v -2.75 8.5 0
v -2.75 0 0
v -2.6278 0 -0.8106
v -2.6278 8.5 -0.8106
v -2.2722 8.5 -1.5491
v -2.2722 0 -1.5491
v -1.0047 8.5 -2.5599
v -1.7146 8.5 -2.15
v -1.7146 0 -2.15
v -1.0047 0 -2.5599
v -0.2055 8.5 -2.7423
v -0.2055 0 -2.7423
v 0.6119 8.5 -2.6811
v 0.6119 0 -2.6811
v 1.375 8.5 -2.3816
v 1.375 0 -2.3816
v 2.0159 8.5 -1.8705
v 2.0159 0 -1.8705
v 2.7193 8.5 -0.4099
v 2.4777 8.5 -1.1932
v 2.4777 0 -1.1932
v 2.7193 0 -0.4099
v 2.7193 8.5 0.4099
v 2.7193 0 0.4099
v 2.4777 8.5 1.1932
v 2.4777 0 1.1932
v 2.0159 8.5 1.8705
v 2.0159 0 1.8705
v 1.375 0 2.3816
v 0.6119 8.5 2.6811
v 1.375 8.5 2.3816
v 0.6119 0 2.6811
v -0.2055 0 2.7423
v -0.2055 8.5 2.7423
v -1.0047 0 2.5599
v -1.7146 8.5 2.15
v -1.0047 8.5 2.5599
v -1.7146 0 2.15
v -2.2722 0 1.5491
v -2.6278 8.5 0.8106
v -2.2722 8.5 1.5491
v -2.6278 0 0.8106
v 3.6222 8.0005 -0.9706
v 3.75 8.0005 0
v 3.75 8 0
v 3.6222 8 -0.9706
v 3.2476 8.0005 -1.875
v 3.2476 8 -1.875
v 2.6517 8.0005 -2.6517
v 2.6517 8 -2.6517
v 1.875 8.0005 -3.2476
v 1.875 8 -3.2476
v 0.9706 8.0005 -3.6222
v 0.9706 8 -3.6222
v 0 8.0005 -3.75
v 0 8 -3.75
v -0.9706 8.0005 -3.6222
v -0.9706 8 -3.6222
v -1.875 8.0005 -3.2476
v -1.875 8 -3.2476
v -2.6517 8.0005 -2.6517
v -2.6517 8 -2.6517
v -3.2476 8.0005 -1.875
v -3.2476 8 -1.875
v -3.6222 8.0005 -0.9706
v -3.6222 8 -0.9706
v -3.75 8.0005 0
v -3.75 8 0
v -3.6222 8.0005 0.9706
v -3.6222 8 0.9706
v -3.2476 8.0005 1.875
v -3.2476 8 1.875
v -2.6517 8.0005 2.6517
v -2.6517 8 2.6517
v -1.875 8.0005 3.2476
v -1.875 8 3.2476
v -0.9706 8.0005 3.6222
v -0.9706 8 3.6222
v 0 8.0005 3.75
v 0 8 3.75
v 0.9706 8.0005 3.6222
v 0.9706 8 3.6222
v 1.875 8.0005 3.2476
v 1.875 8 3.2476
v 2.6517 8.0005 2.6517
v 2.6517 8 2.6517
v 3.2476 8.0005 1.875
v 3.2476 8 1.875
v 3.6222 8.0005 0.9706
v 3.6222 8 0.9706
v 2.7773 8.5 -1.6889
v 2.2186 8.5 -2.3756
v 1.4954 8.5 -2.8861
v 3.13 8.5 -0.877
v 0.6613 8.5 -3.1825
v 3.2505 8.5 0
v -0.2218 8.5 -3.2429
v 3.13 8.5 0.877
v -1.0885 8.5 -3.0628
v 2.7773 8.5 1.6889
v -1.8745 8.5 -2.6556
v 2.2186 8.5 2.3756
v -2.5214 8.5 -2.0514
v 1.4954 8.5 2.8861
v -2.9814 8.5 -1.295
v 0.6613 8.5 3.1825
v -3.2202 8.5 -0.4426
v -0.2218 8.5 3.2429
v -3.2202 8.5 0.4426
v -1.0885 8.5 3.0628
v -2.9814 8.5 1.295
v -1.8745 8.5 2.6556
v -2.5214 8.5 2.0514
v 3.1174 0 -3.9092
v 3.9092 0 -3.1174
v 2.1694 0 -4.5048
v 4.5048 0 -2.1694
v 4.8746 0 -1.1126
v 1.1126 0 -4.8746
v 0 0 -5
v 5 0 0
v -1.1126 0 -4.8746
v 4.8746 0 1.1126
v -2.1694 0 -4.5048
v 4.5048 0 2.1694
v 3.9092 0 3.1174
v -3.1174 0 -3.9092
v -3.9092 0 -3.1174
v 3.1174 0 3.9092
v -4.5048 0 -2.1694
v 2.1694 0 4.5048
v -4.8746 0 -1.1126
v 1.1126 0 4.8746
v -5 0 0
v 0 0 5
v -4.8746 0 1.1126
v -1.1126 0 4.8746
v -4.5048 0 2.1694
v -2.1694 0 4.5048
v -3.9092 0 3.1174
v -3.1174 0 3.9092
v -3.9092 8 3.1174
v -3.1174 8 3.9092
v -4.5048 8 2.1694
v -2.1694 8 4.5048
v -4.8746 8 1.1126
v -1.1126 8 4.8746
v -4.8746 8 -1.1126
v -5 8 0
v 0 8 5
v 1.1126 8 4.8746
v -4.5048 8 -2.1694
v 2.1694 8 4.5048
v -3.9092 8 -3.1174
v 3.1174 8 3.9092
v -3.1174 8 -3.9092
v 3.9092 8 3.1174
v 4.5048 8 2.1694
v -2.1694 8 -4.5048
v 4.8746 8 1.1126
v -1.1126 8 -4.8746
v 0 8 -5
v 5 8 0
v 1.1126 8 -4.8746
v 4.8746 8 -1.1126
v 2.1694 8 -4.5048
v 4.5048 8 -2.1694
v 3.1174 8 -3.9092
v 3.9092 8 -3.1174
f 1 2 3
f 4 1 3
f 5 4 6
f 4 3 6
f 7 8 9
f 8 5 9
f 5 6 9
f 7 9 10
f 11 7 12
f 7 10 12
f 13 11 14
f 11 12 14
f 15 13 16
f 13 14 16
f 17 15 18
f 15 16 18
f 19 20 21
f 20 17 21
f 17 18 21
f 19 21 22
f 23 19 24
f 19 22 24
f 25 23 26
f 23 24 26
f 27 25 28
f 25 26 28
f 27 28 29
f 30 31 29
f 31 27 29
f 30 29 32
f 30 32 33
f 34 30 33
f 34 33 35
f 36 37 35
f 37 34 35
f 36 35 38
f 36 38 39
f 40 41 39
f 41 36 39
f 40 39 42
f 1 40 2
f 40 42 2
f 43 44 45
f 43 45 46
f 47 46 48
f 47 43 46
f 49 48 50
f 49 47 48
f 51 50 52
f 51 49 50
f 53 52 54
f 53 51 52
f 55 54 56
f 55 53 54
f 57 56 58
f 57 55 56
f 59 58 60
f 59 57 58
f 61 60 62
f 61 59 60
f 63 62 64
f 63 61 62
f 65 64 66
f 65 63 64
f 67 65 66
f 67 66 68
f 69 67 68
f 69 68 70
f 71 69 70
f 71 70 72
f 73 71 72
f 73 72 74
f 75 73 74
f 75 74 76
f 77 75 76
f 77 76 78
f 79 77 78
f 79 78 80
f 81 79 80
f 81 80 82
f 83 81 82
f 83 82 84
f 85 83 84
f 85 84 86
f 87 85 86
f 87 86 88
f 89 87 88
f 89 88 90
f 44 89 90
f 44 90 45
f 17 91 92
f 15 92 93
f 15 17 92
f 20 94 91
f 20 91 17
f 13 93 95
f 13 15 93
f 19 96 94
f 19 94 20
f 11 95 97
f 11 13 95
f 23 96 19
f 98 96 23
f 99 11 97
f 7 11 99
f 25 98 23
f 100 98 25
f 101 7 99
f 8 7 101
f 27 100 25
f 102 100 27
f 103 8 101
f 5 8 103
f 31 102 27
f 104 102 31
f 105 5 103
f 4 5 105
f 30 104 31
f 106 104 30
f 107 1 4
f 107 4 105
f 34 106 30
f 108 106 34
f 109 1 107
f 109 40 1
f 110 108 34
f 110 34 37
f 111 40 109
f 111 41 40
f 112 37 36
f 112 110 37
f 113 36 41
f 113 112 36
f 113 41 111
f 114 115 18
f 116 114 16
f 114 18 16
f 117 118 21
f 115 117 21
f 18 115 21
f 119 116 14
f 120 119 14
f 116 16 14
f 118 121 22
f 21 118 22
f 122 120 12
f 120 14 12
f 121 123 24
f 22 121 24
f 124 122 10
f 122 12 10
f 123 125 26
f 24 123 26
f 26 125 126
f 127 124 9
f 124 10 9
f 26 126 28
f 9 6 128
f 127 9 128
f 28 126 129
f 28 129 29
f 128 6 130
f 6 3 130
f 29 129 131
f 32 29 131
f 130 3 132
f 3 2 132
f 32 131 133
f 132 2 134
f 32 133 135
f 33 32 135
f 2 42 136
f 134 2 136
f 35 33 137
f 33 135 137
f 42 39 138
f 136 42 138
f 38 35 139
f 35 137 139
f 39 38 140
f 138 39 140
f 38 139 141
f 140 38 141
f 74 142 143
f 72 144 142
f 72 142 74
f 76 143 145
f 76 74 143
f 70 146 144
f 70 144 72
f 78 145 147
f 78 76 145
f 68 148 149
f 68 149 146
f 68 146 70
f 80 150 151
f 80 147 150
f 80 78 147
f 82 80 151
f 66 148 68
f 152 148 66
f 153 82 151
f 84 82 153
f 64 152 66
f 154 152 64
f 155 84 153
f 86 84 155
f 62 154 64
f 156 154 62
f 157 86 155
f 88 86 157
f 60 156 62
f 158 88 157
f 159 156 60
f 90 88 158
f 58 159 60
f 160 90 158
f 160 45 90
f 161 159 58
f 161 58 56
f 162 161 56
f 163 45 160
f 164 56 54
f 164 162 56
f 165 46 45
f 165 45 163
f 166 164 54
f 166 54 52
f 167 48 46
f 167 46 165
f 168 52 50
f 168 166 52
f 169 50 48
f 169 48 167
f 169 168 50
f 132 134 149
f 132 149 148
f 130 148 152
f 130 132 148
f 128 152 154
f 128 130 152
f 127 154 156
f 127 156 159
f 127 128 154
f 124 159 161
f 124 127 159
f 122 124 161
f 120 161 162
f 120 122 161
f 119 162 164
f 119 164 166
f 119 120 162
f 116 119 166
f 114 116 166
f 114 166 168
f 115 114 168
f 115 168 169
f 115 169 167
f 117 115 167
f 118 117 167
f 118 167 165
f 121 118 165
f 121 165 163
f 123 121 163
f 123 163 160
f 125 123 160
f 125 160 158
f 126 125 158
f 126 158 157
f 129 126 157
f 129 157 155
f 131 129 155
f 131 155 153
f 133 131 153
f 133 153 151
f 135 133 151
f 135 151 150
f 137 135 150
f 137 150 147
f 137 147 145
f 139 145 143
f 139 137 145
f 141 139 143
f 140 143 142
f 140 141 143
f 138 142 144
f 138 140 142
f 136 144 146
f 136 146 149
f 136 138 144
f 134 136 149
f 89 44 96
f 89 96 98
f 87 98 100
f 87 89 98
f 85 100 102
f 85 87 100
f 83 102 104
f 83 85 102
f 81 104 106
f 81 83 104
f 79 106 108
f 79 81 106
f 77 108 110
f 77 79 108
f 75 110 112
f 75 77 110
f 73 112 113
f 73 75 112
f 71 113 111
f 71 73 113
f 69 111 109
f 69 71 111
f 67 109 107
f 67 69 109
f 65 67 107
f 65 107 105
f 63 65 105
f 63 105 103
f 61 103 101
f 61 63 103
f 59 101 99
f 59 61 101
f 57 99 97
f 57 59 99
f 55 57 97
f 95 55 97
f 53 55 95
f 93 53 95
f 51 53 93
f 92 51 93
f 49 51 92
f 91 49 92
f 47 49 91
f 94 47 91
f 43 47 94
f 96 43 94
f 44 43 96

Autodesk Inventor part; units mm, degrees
ref_plane "YZ Plane" through (0, 0, 0) normal (1, 0, 0) x (0, 1, 0)
ref_plane "XZ Plane" through (0, 0, 0) normal (0, 1, 0) x (-1, 0, 0)
ref_plane "XY Plane" through (0, 0, 0) normal (0, 0, 1) x (1, 0, 0)
sketch "Sketch1" plane through (0, 0, 0) normal (0, 1, 0) x (-1, 0, 0)
  circle A0 centre (0, 0) radius 2.75
  circle A1 centre (0, 0) radius 5
  dimension "d0" = 5.5
  dimension "d1" = 10
extrude "Extrusion1" add sketch "Sketch1" along normal blind 8.5
sketch "Sketch2" plane through (0, 8.5, 0) normal (0, 1, 0) x (1, 0, 0)
  circle A0 centre (0, 0) radius 2.75 projected
  circle A1 centre (0, 0) radius 5 projected
  circle A2 centre (0, 0) radius 3.75
  dimension "d4" = 1
extrude "Extrusion2" cut sketch "Sketch2" against normal blind 0.5 contours A1
chamfer "Chamfer1" distance 0.5 angle 45 1 edges at (-3.75, 8.5, 0)
properties part number "m5_9mm"
